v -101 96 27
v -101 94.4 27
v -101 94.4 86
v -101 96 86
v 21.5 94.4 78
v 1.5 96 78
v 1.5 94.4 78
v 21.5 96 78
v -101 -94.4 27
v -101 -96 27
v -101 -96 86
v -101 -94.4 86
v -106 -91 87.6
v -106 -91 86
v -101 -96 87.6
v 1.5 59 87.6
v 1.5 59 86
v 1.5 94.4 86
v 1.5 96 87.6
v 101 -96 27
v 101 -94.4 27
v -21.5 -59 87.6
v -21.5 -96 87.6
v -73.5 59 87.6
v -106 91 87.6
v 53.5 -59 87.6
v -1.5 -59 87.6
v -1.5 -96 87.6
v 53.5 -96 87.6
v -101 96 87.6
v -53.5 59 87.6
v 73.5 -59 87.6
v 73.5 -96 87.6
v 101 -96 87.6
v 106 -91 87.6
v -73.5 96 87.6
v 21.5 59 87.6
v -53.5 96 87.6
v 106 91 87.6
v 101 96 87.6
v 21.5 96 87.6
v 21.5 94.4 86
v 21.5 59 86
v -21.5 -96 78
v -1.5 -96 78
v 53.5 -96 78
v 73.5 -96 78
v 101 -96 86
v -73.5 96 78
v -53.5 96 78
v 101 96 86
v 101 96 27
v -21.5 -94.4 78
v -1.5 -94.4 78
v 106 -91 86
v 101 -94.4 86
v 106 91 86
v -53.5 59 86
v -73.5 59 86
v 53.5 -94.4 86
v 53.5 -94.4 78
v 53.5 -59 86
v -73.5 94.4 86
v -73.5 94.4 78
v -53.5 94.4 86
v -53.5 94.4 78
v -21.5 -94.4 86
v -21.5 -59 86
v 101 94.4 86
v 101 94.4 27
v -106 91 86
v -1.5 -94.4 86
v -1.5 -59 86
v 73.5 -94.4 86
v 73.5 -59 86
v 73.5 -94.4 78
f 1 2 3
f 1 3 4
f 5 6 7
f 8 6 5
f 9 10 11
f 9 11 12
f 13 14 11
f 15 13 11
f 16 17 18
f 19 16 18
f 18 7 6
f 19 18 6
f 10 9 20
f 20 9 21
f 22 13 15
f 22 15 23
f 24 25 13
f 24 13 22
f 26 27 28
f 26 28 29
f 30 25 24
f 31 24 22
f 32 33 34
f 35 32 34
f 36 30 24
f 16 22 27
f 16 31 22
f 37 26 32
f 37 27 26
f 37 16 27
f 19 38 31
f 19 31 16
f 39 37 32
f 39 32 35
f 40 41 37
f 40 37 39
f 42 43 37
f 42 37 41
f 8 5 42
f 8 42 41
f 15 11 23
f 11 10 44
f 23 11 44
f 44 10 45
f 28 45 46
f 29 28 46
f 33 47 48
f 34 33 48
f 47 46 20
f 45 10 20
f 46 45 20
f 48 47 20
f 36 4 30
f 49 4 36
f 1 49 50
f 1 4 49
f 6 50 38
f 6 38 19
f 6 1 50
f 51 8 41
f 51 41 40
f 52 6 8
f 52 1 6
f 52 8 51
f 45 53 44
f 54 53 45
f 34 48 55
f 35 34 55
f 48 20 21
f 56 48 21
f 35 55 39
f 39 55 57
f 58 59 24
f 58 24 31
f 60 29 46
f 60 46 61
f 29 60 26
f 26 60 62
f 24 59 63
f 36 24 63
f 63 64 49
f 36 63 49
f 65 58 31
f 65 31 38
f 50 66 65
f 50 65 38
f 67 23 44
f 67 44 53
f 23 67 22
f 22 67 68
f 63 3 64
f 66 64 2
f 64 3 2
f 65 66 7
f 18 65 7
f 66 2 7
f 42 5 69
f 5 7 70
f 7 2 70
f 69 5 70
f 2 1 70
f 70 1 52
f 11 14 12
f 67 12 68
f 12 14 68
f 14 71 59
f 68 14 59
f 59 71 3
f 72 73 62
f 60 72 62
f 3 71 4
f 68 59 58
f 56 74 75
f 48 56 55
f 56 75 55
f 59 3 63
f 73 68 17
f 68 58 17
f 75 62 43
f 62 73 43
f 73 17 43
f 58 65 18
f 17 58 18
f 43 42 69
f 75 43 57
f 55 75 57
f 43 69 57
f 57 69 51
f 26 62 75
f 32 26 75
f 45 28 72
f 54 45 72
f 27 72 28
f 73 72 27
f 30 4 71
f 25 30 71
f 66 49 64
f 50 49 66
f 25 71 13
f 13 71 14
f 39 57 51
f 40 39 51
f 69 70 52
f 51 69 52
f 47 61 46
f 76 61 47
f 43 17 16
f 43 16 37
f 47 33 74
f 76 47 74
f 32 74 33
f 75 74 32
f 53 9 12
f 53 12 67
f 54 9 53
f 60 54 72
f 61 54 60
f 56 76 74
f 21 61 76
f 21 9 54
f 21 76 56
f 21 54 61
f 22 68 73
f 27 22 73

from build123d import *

# Parameters (mm, degrees)
F_5052_START                               = 86
F_5052_SHEET_TOP_PANEL_DEPTH               = 1.6
FOLDED_START                               = 27
SKETCH2_W                                  = 202
SKETCH2_H                                  = 1.6
FOLDED_SIDE_SKIRTS_WITH_OPEN_ENDS_DEPTH    = 59
FOUR_START                                 = 78
SKETCH3_W                                  = 20
SKETCH3_H                                  = 38
FOUR_SIDE_OPEN_HOSE_AND_WRENCH_SLOTS_DEPTH = 9.6


with BuildPart() as part:
    # Sketch1 → 5052 sheet top panel (new body)
    with BuildSketch(Plane.XY.offset(F_5052_START)):
        Polygon((-101, -96), (101, -96), (106, -91), (106, 91), (101, 96), (-101, 96), (-106, 91), (-106, -91), align=None)
    extrude(amount=F_5052_SHEET_TOP_PANEL_DEPTH)

    # Sketch2 → Folded side skirts with open ends (add)
    with BuildSketch(Plane.XY.offset(FOLDED_START)):
        with Locations((0, 95.2)):
            Rectangle(SKETCH2_W, SKETCH2_H)
        with Locations((0, -95.2)):
            Rectangle(SKETCH2_W, SKETCH2_H)
    extrude(amount=FOLDED_SIDE_SKIRTS_WITH_OPEN_ENDS_DEPTH)

    # Sketch3 → Four side-open hose and wrench slots (cut)
    with BuildSketch(Plane.XY.offset(FOUR_START)):
        with Locations((-63.5, 78)):
            Rectangle(SKETCH3_W, SKETCH3_H)
        with Locations((63.5, -78)):
            Rectangle(SKETCH3_W, SKETCH3_H)
        with Locations((11.5, 78)):
            Rectangle(SKETCH3_W, SKETCH3_H)
        with Locations((-11.5, -78)):
            Rectangle(SKETCH3_W, SKETCH3_H)
    extrude(amount=FOUR_SIDE_OPEN_HOSE_AND_WRENCH_SLOTS_DEPTH, mode=Mode.SUBTRACT)


solid = part.part
